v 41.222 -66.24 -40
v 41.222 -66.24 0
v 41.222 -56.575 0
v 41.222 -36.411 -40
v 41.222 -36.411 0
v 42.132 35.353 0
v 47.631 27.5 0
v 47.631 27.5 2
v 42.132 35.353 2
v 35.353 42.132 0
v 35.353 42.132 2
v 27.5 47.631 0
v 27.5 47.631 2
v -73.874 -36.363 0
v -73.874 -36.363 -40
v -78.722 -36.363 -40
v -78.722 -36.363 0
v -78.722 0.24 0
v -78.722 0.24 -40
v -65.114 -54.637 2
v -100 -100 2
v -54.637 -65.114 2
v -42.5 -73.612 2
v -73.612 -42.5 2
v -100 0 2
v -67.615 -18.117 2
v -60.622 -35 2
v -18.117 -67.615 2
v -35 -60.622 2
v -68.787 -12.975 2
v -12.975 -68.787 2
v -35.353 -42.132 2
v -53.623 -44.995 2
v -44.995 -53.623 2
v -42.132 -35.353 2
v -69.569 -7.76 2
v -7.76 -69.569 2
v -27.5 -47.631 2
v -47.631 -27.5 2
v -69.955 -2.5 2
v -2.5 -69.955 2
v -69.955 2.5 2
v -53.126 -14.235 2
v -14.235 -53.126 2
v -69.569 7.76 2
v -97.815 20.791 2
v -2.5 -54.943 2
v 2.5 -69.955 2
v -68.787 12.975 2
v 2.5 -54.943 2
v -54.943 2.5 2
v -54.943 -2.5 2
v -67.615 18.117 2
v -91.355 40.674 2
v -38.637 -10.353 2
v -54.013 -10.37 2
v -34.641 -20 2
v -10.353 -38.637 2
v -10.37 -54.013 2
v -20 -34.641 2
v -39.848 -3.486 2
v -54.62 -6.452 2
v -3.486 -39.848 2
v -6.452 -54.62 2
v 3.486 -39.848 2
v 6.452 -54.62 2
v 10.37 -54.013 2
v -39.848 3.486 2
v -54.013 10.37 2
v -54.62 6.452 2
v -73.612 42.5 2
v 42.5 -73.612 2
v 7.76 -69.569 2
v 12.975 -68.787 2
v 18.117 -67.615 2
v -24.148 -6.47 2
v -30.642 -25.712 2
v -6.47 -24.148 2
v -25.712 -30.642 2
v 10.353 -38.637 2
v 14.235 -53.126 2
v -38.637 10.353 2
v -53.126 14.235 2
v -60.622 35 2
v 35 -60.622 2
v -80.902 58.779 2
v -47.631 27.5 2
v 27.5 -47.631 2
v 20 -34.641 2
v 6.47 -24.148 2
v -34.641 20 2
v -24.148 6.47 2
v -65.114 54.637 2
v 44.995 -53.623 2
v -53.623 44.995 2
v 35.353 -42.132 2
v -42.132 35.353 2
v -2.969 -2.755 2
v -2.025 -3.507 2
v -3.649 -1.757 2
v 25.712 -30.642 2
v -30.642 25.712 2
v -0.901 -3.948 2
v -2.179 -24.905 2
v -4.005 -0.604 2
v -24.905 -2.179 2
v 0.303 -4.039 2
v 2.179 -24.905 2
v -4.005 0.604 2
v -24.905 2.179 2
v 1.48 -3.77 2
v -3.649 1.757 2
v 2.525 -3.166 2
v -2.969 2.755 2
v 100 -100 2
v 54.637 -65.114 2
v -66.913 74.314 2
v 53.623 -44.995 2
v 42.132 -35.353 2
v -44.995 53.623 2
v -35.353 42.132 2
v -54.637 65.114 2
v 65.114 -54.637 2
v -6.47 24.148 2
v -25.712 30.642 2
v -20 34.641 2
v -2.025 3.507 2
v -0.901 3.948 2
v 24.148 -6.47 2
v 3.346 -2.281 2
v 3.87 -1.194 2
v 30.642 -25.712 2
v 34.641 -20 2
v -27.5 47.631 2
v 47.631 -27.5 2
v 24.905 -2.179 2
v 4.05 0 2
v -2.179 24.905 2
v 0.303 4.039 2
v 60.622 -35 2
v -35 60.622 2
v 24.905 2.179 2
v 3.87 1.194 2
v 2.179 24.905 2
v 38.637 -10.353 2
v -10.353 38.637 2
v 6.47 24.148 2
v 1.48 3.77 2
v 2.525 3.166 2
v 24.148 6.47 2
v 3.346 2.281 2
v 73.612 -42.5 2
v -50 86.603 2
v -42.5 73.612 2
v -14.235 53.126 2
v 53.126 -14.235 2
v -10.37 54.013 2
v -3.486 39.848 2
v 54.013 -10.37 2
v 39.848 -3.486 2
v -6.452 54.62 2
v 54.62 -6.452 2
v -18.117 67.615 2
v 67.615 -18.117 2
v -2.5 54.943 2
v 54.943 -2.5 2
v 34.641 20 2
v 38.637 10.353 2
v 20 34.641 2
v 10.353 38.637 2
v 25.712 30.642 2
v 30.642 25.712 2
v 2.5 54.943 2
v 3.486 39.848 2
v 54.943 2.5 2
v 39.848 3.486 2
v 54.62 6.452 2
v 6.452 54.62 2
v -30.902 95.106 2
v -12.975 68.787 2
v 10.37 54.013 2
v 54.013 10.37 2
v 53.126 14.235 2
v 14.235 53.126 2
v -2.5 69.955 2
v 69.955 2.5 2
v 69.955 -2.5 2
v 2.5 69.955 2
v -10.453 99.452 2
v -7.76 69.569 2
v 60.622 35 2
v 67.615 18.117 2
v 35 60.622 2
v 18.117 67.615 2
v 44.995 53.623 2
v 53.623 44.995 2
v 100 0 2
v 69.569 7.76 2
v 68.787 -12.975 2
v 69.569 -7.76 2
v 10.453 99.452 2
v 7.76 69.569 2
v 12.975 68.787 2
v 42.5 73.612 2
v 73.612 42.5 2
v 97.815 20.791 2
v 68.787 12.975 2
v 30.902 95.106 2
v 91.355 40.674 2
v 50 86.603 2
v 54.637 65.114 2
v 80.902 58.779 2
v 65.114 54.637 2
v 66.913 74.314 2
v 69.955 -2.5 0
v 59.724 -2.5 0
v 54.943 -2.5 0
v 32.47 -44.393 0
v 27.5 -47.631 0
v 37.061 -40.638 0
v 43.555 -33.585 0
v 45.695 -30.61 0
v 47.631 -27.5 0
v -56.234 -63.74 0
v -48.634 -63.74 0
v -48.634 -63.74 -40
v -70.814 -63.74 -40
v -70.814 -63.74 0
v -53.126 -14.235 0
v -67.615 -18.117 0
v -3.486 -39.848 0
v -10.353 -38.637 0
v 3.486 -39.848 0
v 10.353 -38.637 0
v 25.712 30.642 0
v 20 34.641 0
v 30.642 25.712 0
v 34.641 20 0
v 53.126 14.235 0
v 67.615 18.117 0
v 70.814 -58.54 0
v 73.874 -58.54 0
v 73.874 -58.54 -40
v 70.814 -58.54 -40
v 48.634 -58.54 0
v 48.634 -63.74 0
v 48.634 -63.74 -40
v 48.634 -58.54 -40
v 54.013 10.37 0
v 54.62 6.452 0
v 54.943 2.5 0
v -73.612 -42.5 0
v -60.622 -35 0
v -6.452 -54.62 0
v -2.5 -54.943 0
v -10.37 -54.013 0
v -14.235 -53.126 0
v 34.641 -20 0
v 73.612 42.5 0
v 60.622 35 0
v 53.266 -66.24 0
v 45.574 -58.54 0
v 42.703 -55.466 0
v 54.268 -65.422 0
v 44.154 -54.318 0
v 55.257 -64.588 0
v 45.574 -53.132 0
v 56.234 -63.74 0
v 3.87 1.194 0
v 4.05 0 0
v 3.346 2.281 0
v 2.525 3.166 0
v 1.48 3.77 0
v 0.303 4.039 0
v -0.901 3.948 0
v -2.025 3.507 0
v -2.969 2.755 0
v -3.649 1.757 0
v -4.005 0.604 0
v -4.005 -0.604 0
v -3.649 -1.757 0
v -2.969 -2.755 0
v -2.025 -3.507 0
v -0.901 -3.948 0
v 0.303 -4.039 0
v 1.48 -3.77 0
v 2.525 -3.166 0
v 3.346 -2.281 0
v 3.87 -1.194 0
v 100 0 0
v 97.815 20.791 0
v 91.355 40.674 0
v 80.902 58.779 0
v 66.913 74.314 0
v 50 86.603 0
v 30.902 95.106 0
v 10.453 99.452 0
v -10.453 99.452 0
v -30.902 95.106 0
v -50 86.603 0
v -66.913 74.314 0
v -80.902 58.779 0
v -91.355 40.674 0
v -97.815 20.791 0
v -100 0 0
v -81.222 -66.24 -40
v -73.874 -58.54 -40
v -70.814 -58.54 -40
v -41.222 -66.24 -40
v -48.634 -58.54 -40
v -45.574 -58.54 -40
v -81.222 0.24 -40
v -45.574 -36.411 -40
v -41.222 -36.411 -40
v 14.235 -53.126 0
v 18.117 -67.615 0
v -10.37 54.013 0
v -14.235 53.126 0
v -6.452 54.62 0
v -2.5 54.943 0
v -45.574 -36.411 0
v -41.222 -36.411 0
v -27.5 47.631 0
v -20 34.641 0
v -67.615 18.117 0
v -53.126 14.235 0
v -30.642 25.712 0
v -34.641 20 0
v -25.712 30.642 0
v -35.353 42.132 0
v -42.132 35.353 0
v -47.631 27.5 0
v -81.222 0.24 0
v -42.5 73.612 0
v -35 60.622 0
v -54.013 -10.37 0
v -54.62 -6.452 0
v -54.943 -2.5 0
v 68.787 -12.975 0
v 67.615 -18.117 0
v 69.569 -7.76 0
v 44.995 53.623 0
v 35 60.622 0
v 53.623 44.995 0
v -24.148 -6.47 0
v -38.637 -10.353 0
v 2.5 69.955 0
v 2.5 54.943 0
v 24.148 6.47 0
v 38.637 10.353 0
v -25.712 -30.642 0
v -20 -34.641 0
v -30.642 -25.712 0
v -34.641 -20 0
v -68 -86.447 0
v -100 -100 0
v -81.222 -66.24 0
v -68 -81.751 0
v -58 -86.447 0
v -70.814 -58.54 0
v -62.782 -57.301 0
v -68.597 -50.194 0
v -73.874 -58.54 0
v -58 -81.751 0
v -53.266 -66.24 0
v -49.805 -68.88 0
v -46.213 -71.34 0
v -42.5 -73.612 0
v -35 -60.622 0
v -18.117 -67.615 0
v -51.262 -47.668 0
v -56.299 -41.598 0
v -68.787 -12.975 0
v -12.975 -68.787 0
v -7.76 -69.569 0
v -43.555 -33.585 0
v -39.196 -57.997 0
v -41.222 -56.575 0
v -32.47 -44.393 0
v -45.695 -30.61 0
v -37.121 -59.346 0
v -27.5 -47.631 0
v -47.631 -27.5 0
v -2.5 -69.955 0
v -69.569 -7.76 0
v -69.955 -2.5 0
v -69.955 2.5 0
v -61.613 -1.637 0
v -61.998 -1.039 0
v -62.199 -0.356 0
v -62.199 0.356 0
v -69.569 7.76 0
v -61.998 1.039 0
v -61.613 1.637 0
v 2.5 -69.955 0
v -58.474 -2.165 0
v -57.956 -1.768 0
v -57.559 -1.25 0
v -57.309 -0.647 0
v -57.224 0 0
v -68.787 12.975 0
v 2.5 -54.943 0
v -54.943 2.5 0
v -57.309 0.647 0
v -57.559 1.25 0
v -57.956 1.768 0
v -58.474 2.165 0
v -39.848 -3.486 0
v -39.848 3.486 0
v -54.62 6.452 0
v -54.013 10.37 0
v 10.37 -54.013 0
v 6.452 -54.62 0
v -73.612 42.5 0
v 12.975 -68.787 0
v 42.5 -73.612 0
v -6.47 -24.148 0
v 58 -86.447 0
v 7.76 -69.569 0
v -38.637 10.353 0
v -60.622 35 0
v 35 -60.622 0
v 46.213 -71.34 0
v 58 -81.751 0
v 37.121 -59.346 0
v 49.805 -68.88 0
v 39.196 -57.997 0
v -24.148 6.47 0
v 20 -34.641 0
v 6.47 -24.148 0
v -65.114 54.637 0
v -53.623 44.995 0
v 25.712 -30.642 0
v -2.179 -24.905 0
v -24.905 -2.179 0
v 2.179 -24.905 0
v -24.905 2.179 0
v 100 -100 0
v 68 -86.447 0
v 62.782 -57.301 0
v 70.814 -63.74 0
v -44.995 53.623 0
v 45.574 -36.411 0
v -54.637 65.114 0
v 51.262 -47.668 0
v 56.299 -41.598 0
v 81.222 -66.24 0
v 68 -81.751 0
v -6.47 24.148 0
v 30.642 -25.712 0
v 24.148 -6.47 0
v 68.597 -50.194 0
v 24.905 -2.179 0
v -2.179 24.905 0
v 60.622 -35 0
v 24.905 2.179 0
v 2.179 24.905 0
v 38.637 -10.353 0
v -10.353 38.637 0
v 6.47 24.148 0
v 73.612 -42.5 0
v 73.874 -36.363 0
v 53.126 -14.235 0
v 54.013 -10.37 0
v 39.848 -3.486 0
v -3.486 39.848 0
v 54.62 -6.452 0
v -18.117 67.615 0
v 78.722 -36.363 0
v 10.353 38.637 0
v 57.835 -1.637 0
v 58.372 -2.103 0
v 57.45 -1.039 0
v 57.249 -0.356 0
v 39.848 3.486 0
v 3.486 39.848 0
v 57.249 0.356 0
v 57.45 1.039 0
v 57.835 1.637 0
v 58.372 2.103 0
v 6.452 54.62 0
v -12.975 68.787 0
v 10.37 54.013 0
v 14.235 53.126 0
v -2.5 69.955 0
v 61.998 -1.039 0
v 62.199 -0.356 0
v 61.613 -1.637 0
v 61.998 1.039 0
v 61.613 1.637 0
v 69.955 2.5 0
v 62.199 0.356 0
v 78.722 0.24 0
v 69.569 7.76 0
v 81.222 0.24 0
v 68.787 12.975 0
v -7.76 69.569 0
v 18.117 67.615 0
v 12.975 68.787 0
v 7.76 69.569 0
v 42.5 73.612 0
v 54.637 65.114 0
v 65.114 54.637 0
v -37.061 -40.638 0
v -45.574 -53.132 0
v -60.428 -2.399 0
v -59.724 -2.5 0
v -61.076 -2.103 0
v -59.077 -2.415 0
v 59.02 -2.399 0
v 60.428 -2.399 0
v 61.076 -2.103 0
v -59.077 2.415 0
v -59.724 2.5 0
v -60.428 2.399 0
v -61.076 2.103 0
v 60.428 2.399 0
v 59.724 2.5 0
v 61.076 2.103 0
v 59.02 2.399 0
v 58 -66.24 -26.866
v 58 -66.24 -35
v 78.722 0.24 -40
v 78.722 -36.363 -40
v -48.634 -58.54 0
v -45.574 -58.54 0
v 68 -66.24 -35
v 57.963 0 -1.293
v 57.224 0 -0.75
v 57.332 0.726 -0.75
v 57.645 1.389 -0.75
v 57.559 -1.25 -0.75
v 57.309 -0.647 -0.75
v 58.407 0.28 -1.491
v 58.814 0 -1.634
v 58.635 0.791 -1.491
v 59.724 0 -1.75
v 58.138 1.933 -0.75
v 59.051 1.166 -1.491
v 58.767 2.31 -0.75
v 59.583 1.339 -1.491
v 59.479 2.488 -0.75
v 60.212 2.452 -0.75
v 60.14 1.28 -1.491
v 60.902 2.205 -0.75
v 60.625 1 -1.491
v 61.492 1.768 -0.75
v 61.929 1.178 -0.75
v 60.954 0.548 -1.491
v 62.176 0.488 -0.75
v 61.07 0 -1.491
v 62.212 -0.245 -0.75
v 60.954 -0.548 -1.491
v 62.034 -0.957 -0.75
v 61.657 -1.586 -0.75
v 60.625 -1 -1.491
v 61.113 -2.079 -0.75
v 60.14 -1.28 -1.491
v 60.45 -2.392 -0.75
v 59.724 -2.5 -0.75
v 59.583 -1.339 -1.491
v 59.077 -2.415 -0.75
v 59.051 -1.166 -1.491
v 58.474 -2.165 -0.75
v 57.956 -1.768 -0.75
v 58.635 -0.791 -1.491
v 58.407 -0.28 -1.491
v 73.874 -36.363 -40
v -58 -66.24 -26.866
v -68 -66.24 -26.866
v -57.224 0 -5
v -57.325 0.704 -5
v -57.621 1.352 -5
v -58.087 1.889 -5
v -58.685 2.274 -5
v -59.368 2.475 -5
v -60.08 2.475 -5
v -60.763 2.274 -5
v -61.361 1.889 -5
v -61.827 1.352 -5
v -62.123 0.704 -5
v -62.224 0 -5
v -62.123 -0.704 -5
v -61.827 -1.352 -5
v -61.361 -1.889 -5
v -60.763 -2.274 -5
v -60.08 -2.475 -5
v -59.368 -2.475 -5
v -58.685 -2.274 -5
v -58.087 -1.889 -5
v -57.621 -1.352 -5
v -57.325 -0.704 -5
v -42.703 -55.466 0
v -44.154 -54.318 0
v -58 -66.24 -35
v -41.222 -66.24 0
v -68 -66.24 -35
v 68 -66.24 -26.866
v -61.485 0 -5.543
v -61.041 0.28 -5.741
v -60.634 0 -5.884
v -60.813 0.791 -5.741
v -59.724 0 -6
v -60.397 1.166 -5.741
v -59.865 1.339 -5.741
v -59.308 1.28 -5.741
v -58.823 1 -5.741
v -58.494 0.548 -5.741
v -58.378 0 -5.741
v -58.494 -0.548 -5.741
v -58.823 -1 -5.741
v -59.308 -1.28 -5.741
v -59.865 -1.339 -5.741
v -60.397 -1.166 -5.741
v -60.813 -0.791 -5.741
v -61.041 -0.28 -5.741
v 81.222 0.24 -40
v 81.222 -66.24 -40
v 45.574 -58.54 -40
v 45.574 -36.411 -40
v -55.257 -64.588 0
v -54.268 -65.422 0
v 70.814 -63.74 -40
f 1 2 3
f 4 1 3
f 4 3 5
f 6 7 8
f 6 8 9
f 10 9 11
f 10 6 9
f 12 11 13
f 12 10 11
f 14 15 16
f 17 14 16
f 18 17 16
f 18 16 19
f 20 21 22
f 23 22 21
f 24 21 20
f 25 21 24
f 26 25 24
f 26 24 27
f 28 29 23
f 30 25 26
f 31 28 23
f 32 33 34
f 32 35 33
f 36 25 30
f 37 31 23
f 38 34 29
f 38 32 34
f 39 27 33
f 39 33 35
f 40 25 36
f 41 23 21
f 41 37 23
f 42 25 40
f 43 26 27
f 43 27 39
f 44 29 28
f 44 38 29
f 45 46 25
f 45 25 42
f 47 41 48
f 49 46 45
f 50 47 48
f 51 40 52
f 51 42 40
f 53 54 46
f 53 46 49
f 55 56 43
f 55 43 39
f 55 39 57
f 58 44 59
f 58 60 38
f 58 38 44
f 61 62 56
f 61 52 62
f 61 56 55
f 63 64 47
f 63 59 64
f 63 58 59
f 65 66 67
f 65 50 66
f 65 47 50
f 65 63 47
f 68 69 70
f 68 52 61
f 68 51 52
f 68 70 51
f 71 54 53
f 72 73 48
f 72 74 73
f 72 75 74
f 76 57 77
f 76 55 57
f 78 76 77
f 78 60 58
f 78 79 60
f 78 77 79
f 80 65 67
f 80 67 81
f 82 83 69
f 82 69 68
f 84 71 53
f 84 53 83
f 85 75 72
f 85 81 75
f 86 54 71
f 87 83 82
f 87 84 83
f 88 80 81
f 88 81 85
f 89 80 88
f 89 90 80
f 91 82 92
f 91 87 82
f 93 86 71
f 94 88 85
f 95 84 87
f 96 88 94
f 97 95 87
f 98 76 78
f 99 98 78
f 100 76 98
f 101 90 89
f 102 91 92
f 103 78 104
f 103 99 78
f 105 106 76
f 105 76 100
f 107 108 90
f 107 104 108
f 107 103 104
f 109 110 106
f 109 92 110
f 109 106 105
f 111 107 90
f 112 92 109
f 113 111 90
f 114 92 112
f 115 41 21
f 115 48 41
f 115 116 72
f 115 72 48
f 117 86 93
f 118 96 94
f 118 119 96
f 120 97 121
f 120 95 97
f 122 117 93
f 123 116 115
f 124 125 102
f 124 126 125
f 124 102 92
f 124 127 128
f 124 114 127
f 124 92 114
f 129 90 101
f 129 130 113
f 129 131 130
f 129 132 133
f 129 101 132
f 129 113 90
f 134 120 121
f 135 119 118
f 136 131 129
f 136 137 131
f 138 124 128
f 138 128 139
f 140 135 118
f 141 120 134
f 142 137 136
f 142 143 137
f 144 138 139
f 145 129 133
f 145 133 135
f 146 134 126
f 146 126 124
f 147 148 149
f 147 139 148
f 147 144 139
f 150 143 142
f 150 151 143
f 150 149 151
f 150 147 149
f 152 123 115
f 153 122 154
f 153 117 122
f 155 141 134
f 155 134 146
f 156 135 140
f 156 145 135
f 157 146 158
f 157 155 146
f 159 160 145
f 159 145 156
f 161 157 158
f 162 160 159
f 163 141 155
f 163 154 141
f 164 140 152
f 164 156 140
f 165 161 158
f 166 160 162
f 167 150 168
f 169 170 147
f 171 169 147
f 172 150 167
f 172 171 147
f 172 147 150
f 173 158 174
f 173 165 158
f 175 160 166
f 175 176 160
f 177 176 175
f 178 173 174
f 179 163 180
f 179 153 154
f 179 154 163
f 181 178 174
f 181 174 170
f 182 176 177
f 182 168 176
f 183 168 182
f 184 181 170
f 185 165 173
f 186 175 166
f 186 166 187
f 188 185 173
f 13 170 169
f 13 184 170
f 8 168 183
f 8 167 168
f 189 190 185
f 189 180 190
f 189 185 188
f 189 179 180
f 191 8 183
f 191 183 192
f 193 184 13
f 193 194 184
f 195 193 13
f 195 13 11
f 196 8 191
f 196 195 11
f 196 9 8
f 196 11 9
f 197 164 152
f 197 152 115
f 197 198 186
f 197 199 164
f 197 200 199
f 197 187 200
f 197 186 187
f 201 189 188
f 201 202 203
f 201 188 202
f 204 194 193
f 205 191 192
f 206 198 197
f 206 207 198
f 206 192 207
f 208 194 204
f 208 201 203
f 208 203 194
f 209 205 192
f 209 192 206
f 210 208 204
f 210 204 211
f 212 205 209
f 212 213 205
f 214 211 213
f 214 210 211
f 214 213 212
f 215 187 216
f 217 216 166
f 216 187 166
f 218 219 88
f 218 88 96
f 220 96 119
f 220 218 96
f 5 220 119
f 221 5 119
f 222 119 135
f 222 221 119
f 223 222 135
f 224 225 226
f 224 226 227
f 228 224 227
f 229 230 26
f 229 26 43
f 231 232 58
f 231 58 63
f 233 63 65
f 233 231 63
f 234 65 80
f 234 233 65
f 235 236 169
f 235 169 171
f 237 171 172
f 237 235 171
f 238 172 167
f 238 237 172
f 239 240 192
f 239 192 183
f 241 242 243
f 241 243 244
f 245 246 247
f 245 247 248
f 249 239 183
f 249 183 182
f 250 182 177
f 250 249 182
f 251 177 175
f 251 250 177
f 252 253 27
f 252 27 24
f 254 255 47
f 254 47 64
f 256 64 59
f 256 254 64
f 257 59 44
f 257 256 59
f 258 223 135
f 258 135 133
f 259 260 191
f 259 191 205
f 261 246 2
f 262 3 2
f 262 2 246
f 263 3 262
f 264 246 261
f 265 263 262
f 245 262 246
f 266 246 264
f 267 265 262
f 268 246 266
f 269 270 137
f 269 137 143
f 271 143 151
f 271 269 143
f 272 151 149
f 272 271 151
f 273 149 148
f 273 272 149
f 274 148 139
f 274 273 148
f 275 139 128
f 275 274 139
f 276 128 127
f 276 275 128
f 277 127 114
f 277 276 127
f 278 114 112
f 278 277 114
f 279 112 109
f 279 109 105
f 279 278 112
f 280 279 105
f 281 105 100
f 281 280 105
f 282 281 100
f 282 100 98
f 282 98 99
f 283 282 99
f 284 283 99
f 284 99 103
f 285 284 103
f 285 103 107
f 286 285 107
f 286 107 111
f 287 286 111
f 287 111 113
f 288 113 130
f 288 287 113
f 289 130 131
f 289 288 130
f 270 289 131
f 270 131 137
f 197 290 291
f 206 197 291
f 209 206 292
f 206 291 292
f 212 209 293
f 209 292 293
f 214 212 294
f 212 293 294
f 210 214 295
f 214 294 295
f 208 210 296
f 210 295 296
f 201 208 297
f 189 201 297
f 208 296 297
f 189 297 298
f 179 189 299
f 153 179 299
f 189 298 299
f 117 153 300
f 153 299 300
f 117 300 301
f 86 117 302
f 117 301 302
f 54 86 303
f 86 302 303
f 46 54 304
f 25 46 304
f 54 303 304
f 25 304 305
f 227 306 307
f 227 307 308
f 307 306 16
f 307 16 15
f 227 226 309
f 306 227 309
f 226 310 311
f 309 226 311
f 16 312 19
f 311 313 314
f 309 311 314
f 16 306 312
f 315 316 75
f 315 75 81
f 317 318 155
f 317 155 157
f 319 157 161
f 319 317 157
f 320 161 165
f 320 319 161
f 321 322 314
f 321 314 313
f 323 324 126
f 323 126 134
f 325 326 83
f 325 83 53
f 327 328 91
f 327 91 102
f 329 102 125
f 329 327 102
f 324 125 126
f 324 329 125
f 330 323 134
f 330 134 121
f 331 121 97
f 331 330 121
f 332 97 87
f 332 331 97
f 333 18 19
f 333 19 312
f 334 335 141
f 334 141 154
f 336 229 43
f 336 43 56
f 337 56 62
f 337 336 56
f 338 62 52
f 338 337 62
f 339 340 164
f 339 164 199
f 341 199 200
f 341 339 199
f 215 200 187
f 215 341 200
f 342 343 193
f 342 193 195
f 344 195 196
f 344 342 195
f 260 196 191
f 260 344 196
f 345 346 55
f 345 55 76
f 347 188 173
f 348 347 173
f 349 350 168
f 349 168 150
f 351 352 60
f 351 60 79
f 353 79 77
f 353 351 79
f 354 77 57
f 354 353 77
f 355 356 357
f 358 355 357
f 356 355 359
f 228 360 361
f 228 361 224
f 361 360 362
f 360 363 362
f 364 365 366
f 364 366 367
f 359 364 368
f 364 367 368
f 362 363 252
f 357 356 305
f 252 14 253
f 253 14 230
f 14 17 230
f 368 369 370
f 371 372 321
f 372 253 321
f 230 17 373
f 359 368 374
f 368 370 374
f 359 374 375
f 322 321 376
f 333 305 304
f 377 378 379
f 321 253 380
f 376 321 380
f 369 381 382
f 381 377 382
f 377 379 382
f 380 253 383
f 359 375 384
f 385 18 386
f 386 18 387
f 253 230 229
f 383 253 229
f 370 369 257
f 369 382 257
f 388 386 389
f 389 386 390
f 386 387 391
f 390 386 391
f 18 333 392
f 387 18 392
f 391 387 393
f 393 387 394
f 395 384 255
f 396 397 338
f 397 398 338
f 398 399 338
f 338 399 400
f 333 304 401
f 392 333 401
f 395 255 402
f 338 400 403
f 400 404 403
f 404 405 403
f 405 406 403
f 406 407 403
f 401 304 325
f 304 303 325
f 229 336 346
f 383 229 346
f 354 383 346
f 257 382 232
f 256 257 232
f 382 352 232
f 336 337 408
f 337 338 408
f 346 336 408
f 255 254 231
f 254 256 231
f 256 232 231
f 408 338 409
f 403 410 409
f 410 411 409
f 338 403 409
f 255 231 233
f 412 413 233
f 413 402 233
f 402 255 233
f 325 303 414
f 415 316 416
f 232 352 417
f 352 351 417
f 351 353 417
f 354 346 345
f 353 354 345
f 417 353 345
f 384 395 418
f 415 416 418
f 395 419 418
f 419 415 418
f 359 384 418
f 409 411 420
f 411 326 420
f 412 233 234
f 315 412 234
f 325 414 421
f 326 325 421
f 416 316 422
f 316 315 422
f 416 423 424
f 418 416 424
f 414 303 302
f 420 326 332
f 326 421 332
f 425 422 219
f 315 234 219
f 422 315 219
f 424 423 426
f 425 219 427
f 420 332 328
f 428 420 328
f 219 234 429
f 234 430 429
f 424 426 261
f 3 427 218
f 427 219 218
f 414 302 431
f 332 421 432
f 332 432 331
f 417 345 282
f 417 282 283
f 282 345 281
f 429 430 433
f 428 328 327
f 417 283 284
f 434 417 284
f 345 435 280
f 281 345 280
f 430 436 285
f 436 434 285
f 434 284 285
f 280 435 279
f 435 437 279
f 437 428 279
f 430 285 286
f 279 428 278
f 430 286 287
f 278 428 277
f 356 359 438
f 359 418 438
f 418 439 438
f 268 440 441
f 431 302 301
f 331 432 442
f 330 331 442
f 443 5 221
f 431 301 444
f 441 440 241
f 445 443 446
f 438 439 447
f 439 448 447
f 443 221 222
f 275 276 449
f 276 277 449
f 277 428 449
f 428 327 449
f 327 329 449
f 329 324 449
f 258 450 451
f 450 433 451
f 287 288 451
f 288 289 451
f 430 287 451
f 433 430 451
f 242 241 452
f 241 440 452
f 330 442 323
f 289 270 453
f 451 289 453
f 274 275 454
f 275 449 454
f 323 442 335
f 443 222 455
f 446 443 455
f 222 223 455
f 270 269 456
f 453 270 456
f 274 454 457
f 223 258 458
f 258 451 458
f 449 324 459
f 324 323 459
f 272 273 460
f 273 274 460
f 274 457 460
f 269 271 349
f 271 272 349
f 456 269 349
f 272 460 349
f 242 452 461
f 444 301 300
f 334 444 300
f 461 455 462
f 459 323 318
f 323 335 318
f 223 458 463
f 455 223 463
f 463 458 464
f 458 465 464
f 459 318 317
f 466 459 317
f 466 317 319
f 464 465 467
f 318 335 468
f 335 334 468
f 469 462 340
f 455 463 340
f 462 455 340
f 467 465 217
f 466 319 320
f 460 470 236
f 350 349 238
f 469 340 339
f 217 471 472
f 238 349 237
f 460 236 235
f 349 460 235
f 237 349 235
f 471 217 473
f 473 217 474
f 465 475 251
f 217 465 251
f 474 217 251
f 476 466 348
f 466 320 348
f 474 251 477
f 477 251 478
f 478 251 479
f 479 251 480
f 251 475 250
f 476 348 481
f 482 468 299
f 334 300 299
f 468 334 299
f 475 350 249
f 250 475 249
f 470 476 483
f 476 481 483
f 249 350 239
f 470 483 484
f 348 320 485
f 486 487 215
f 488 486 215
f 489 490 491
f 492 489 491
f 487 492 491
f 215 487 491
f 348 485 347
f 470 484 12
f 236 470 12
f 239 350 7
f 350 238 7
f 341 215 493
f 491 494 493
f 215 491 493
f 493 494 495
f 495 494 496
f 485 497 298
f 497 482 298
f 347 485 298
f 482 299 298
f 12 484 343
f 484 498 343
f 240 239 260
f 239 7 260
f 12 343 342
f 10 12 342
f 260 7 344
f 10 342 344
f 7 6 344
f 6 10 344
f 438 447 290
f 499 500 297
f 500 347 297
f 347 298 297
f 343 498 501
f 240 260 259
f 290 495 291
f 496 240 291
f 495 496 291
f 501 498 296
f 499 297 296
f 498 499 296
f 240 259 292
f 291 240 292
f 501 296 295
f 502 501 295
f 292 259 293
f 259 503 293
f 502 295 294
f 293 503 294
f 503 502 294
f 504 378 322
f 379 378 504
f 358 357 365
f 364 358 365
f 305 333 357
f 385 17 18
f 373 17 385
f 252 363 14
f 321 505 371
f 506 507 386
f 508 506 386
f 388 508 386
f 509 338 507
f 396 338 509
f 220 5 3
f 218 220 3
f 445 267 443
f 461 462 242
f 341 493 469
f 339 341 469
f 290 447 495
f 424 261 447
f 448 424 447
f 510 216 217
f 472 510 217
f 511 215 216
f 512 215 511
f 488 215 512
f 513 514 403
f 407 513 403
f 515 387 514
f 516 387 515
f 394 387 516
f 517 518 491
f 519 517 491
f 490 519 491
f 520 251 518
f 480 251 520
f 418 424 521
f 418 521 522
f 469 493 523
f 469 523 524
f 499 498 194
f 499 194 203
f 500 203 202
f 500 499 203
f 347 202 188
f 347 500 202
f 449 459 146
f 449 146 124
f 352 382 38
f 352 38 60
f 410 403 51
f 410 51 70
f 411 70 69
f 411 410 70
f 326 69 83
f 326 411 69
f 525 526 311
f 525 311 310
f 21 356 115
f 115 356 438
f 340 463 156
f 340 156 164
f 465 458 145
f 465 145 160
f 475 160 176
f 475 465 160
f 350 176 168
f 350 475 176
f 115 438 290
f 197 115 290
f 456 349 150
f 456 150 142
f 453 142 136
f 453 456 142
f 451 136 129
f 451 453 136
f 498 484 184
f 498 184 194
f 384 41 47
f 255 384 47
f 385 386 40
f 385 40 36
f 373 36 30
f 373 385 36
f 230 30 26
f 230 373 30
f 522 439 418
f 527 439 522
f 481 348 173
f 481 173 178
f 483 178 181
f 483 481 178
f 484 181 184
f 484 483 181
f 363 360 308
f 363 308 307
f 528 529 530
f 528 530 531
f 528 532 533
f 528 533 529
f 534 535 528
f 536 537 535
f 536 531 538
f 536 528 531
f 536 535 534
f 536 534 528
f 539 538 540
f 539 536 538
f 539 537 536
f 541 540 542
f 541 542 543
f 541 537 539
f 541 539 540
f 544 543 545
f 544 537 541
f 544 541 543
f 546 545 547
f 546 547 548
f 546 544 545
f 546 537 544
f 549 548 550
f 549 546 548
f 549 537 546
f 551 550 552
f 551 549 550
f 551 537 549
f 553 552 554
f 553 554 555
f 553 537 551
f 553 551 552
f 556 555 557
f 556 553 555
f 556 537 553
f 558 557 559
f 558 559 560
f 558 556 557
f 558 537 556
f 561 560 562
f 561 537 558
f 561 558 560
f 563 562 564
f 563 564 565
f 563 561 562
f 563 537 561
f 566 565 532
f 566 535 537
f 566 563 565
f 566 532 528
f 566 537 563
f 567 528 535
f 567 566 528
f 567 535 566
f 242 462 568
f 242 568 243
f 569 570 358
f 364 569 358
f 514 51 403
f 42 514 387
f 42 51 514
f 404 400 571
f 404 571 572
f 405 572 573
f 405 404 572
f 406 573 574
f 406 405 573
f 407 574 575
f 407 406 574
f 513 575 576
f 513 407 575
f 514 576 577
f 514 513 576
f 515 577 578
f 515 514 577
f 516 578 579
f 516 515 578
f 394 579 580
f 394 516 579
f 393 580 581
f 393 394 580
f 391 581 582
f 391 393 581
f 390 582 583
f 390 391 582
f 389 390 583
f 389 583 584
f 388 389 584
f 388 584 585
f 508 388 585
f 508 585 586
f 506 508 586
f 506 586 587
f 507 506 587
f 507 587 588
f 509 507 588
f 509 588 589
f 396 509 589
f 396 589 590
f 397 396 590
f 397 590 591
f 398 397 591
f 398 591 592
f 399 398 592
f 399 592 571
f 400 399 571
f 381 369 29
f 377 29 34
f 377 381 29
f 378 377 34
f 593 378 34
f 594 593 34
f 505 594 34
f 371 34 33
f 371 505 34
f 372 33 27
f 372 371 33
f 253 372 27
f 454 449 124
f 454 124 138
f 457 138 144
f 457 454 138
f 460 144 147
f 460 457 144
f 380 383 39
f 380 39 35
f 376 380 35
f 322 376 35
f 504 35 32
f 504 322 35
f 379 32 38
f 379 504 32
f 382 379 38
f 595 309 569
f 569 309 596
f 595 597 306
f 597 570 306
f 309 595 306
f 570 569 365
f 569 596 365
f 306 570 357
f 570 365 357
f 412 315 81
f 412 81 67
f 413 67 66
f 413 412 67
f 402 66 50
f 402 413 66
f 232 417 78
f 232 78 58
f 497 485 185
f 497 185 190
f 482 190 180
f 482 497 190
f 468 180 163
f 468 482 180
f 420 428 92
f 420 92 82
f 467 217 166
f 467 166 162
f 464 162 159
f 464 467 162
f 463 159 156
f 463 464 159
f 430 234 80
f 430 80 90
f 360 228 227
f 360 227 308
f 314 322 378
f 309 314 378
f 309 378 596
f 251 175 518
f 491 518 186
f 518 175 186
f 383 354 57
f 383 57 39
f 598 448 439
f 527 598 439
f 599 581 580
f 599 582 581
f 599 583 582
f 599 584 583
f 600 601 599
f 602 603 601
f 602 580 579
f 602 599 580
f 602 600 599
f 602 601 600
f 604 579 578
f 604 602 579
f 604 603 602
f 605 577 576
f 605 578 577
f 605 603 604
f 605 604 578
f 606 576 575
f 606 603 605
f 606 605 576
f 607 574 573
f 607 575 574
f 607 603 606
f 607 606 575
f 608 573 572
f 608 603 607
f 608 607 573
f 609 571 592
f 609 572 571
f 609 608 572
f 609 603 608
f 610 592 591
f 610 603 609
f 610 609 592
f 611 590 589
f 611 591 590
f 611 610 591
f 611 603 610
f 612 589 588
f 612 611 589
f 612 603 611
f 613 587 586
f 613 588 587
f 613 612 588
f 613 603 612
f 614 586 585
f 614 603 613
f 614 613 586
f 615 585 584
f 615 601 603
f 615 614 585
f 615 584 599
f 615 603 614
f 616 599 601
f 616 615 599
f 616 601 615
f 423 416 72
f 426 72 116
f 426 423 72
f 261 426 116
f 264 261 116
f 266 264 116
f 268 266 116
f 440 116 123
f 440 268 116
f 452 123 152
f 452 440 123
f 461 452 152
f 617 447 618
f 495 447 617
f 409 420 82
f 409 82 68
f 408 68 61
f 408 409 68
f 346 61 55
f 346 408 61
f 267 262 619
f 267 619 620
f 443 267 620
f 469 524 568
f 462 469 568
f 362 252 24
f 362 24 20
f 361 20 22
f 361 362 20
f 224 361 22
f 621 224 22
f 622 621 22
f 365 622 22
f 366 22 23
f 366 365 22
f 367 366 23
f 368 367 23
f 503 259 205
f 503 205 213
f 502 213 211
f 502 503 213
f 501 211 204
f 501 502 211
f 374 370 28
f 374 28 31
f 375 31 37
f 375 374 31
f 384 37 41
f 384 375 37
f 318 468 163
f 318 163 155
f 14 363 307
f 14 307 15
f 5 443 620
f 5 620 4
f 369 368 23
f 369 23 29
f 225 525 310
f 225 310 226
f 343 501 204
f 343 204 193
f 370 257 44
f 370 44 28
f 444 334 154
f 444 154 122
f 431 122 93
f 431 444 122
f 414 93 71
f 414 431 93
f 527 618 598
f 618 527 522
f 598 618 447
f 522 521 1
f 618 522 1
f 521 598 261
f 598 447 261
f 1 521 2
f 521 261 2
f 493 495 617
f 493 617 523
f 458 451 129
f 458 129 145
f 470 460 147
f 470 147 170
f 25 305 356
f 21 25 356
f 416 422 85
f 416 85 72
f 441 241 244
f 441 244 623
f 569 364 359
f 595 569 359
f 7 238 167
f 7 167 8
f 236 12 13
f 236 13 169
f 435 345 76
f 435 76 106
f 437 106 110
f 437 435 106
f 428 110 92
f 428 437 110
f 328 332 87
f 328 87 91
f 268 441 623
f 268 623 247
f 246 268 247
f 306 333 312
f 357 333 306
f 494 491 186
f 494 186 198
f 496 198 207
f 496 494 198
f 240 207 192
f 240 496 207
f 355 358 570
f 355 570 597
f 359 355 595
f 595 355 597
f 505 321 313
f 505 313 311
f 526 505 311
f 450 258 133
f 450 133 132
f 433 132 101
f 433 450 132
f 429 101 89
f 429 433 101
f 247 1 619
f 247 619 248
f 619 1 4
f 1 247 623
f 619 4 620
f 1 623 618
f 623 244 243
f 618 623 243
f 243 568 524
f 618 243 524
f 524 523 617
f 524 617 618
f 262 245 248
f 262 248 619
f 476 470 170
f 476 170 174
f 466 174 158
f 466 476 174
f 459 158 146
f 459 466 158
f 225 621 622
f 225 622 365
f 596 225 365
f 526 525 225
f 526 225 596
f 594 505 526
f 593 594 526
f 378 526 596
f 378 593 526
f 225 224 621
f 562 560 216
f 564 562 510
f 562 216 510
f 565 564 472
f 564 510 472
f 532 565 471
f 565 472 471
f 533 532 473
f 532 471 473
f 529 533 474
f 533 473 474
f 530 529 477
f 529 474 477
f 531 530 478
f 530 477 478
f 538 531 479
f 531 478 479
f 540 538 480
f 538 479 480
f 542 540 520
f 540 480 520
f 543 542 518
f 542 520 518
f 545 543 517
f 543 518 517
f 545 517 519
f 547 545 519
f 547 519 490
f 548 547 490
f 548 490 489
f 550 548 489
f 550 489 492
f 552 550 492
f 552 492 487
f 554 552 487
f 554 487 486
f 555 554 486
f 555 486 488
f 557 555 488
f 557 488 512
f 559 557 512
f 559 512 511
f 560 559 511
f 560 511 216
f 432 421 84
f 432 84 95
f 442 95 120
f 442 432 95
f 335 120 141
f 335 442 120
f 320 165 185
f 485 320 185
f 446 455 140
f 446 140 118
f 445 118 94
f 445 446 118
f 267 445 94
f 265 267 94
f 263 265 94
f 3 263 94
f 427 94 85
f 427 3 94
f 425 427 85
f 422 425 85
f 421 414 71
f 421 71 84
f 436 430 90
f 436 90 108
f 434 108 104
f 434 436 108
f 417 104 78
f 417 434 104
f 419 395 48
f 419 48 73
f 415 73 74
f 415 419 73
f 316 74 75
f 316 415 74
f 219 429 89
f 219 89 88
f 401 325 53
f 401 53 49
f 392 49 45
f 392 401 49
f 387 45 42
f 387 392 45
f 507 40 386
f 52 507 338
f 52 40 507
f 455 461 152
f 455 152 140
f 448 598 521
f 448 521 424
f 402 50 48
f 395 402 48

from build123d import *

# Parameters (mm, degrees)
SKETCH2_R           = 4.05
BOSS_EXTRUDE1_DEPTH = 2
BOSS_EXTRUDE2_DEPTH = 40
BOSS_EXTRUDE3_DEPTH = 5
BOSS_EXTRUDE4_DEPTH = 2
SKETCH10_R          = 2.5
BOSS_EXTRUDE5_DEPTH = 7
DOME1_FACE_RADIUS   = 2.5
DOME1_HEIGHT        = 1
SKETCH12_R          = 2.5
BOSS_EXTRUDE6_DEPTH = 0.75
DOME2_FACE_RADIUS   = 2.5
DOME2_HEIGHT        = 1


with BuildPart() as part:
    # Sketch2 → Boss-Extrude1 (new body)
    with BuildSketch(Plane.XY):
        with BuildLine():
            Line((-100, 0), (-100, -100))
            Line((-100, -100), (100, -100))
            Line((100, -100), (100, 0))
            ThreePointArc((100, 0), (0, 100), (-100, 0))
        make_face()
        Circle(SKETCH2_R, mode=Mode.SUBTRACT)
        with BuildLine():
            Line((6.470476128, 24.148145657), (10.352761804, 38.637033052))
            ThreePointArc((10.352761804, 38.637033052), (0, 40), (-10.352761804, 38.637033052))
            Line((-10.352761804, 38.637033052), (-6.470476128, 24.148145657))
            ThreePointArc((-6.470476128, 24.148145657), (0, 25), (6.470476128, 24.148145657))
        make_face(mode=Mode.SUBTRACT)
        with BuildLine():
            Line((14.235047481, 53.125920446), (18.117333157, 67.61480784))
            ThreePointArc((18.117333157, 67.61480784), (0, 70), (-18.117333157, 67.61480784))
            Line((-18.117333157, 67.61480784), (-14.235047481, 53.125920446))
            ThreePointArc((-14.235047481, 53.125920446), (0, 55), (14.235047481, 53.125920446))
        make_face(mode=Mode.SUBTRACT)
        with BuildLine():
            Line((-20, 34.641016151), (-27.5, 47.631397208))
            ThreePointArc((-27.5, 47.631397208), (-38.890872965, 38.890872965), (-47.631397208, 27.5))
            Line((-47.631397208, 27.5), (-34.641016151, 20))
            ThreePointArc((-34.641016151, 20), (-28.284271247, 28.284271247), (-20, 34.641016151))
        make_face(mode=Mode.SUBTRACT)
        with BuildLine():
            Line((-35, 60.621778265), (-42.5, 73.612159322))
            ThreePointArc((-42.5, 73.612159322), (-60.104076401, 60.104076401), (-73.612159322, 42.5))
            Line((-73.612159322, 42.5), (-60.621778265, 35))
            ThreePointArc((-60.621778265, 35), (-49.497474683, 49.497474683), (-35, 60.621778265))
        make_face(mode=Mode.SUBTRACT)
        with BuildLine():
            Line((42.5, 73.612159322), (35, 60.621778265))
            ThreePointArc((35, 60.621778265), (49.497474683, 49.497474683), (60.621778265, 35))
            Line((60.621778265, 35), (73.612159322, 42.5))
            ThreePointArc((73.612159322, 42.5), (60.104076401, 60.104076401), (42.5, 73.612159322))
        make_face(mode=Mode.SUBTRACT)
        with BuildLine():
            Line((27.5, 47.631397208), (20, 34.641016151))
            ThreePointArc((20, 34.641016151), (28.284271247, 28.284271247), (34.641016151, 20))
            Line((34.641016151, 20), (47.631397208, 27.5))
            ThreePointArc((47.631397208, 27.5), (38.890872965, 38.890872965), (27.5, 47.631397208))
        make_face(mode=Mode.SUBTRACT)
        with BuildLine():
            Line((24.148145657, -6.470476128), (38.637033052, -10.352761804))
            ThreePointArc((38.637033052, -10.352761804), (40, 0), (38.637033052, 10.352761804))
            Line((38.637033052, 10.352761804), (24.148145657, 6.470476128))
            ThreePointArc((24.148145657, 6.470476128), (25, 0), (24.148145657, -6.470476128))
        make_face(mode=Mode.SUBTRACT)
        with BuildLine():
            Line((53.125920446, -14.235047481), (67.61480784, -18.117333157))
            ThreePointArc((67.61480784, -18.117333157), (70, 0), (67.61480784, 18.117333157))
            Line((67.61480784, 18.117333157), (53.125920446, 14.235047481))
            ThreePointArc((53.125920446, 14.235047481), (55, 0), (53.125920446, -14.235047481))
        make_face(mode=Mode.SUBTRACT)
        with BuildLine():
            Line((73.612159322, -42.5), (60.621778265, -35))
            ThreePointArc((60.621778265, -35), (49.497474683, -49.497474683), (35, -60.621778265))
            Line((35, -60.621778265), (42.5, -73.612159322))
            ThreePointArc((42.5, -73.612159322), (60.104076401, -60.104076401), (73.612159322, -42.5))
        make_face(mode=Mode.SUBTRACT)
        with BuildLine():
            Line((47.631397208, -27.5), (34.641016151, -20))
            ThreePointArc((34.641016151, -20), (28.284271247, -28.284271247), (20, -34.641016151))
            Line((20, -34.641016151), (27.5, -47.631397208))
            ThreePointArc((27.5, -47.631397208), (38.890872965, -38.890872965), (47.631397208, -27.5))
        make_face(mode=Mode.SUBTRACT)
        with BuildLine():
            Line((-6.470476128, -24.148145657), (-10.352761804, -38.637033052))
            ThreePointArc((-10.352761804, -38.637033052), (0, -40), (10.352761804, -38.637033052))
            Line((10.352761804, -38.637033052), (6.470476128, -24.148145657))
            ThreePointArc((6.470476128, -24.148145657), (0, -25), (-6.470476128, -24.148145657))
        make_face(mode=Mode.SUBTRACT)
        with BuildLine():
            Line((-14.235047481, -53.125920446), (-18.117333157, -67.61480784))
            ThreePointArc((-18.117333157, -67.61480784), (0, -70), (18.117333157, -67.61480784))
            Line((18.117333157, -67.61480784), (14.235047481, -53.125920446))
            ThreePointArc((14.235047481, -53.125920446), (0, -55), (-14.235047481, -53.125920446))
        make_face(mode=Mode.SUBTRACT)
        with BuildLine():
            Line((-42.5, -73.612159322), (-35, -60.621778265))
            ThreePointArc((-35, -60.621778265), (-49.497474683, -49.497474683), (-60.621778265, -35))
            Line((-60.621778265, -35), (-73.612159322, -42.5))
            ThreePointArc((-73.612159322, -42.5), (-60.104076401, -60.104076401), (-42.5, -73.612159322))
        make_face(mode=Mode.SUBTRACT)
        with BuildLine():
            Line((-27.5, -47.631397208), (-20, -34.641016151))
            ThreePointArc((-20, -34.641016151), (-28.284271247, -28.284271247), (-34.641016151, -20))
            Line((-34.641016151, -20), (-47.631397208, -27.5))
            ThreePointArc((-47.631397208, -27.5), (-38.890872965, -38.890872965), (-27.5, -47.631397208))
        make_face(mode=Mode.SUBTRACT)
        with BuildLine():
            Line((-24.148145657, 6.470476128), (-38.637033052, 10.352761804))
            ThreePointArc((-38.637033052, 10.352761804), (-40, 0), (-38.637033052, -10.352761804))
            Line((-38.637033052, -10.352761804), (-24.148145657, -6.470476128))
            ThreePointArc((-24.148145657, -6.470476128), (-25, 0), (-24.148145657, 6.470476128))
        make_face(mode=Mode.SUBTRACT)
        with BuildLine():
            Line((-53.125920446, 14.235047481), (-67.61480784, 18.117333157))
            ThreePointArc((-67.61480784, 18.117333157), (-70, 0), (-67.61480784, -18.117333157))
            Line((-67.61480784, -18.117333157), (-53.125920446, -14.235047481))
            ThreePointArc((-53.125920446, -14.235047481), (-55, 0), (-53.125920446, 14.235047481))
        make_face(mode=Mode.SUBTRACT)
    extrude(amount=BOSS_EXTRUDE1_DEPTH)

    # Sketch4 → Boss-Extrude2 (add)
    with BuildSketch(Plane(origin=(0, 0, 0), x_dir=(-1, 0, 0), z_dir=(0, 0, -1))):
        Polygon((-70.814, -63.74), (-48.634, -63.74), (-48.634, -58.54), (-45.574, -58.54), (-45.574, -36.410509339), (-41.222261094, -36.410509339), (-41.222261094, -63.74), (-41.222261094, -66.24), (-76.222261094, -66.24), (-81.222261094, -66.24), (-81.222261094, 0.239543082), (-78.722261094, 0.239543082), (-78.722261094, -36.363042073), (-73.874, -36.363042073), (-73.874, -58.54), (-70.814, -58.54), align=None)
        Polygon((81.222261094, -66.24), (76.222261094, -66.24), (41.222261094, -66.24), (41.222261094, -63.74), (41.222261094, -36.410509339), (45.574, -36.410509339), (45.574, -58.54), (48.634, -58.54), (48.634, -63.74), (70.814, -63.74), (70.814, -58.54), (73.874, -58.54), (73.874, -36.363042073), (78.722261094, -36.363042073), (78.722261094, 0.239543082), (81.222261094, 0.239543082), align=None)
    extrude(amount=BOSS_EXTRUDE2_DEPTH)

    # Sketch7 → Boss-Extrude3 (add, symmetric)
    with BuildSketch(Plane(origin=(63, 0, 0), x_dir=(0, 0, -1), z_dir=(1, 0, 0))):
        Polygon((0, -86.447259422), (35, -66.24), (26.86565258, -66.24), (0, -81.750891749), align=None)
    boss_extrude3 = extrude(amount=BOSS_EXTRUDE3_DEPTH, both=True)

    # Mirror1: Boss-Extrude3 across plane
    add(boss_extrude3.mirror(Plane(origin=(0, 0, 0), x_dir=(0, 0, 1), z_dir=(1, 0, 0))))


with BuildPart() as boss_extrude4_tool:
    # Sketch8 → Boss-Extrude4 (new body)
    with BuildSketch(Plane.XY.offset(2)):
        with BuildLine():
            Line((-54.94315244, 2.5), (-69.955342898, 2.5))
            add(Edge.make_bspline(
                [(-69.955342898, 2.5), (-70.044657102, 0), (-69.955342898, -2.5)],
                knots=[0, 0, 0, 1, 1, 1], degree=2))
            Line((-69.955342898, -2.5), (-54.94315244, -2.5))
            add(Edge.make_bspline(
                [(-54.94315244, 2.5), (-55.05684756, 0), (-54.94315244, -2.5)],
                knots=[0, 0, 0, 1, 1, 1], degree=2))
        make_face()
        with BuildLine():
            Line((-2.5, 54.94315244), (-2.5, 69.955342898))
            add(Edge.make_bspline(
                [(2.5, 69.955342898), (0, 70.044657102), (-2.5, 69.955342898)],
                knots=[0, 0, 0, 1, 1, 1], degree=2))
            Line((2.5, 69.955342898), (2.5, 54.94315244))
            add(Edge.make_bspline(
                [(2.5, 54.94315244), (0, 55.05684756), (-2.5, 54.94315244)],
                knots=[0, 0, 0, 1, 1, 1], degree=2))
        make_face()
        with BuildLine():
            Line((54.94315244, 2.5), (69.955342898, 2.5))
            add(Edge.make_bspline(
                [(69.955342898, -2.5), (70.044657102, 0), (69.955342898, 2.5)],
                knots=[0, 0, 0, 1, 1, 1], degree=2))
            Line((69.955342898, -2.5), (54.94315244, -2.5))
            add(Edge.make_bspline(
                [(54.94315244, -2.5), (55.05684756, 0), (54.94315244, 2.5)],
                knots=[0, 0, 0, 1, 1, 1], degree=2))
        make_face()
        with BuildLine():
            Line((2.5, -54.94315244), (2.5, -69.955342898))
            add(Edge.make_bspline(
                [(-2.5, -69.955342898), (0, -70.044657102), (2.5, -69.955342898)],
                knots=[0, 0, 0, 1, 1, 1], degree=2))
            Line((-2.5, -69.955342898), (-2.5, -54.94315244))
            add(Edge.make_bspline(
                [(-2.5, -54.94315244), (0, -55.05684756), (2.5, -54.94315244)],
                knots=[0, 0, 0, 1, 1, 1], degree=2))
        make_face()
    extrude(amount=-BOSS_EXTRUDE4_DEPTH)


with BuildPart() as part_1:
    add(part.part)


with BuildPart() as part_2:
    # Boss-Extrude4: joined with boss_extrude4_tool
    add(part_1.part.fuse(boss_extrude4_tool.part, tol=0.00001))

    # Sketch10 → Boss-Extrude5 (add)
    with BuildSketch(Plane.XY.offset(2)):
        with Locations((-59.724, 0)):
            Circle(SKETCH10_R)
    extrude(amount=-BOSS_EXTRUDE5_DEPTH)

    # Dome1: a dome of height H over a round flat face of radius A is a cap of a sphere of radius (A * A + H * H) / (2 * H)
    dome1_r = (DOME1_FACE_RADIUS * DOME1_FACE_RADIUS + DOME1_HEIGHT * DOME1_HEIGHT) / (2 * DOME1_HEIGHT)
    dome1_base = Plane((-59.724, 0, -5), z_dir=(0, 0, -1))
    with Locations(dome1_base.offset(DOME1_HEIGHT - dome1_r)):
        dome1_ball = Sphere(dome1_r, mode=Mode.PRIVATE)
    add(split(dome1_ball, bisect_by=dome1_base, keep=Keep.TOP, mode=Mode.PRIVATE))

    # Sketch12 → Boss-Extrude6 (add)
    with BuildSketch(Plane(origin=(0, 0, 0), x_dir=(-1, 0, 0), z_dir=(0, 0, -1))):
        with Locations(Location((-59.724, 0, 0), (0, 0, 270))):
            Circle(SKETCH12_R)
    extrude(amount=BOSS_EXTRUDE6_DEPTH)

    # Dome2: a dome of height H over a round flat face of radius A is a cap of a sphere of radius (A * A + H * H) / (2 * H)
    dome2_r = (DOME2_FACE_RADIUS * DOME2_FACE_RADIUS + DOME2_HEIGHT * DOME2_HEIGHT) / (2 * DOME2_HEIGHT)
    dome2_base = Plane((59.724, 0, -0.75), z_dir=(0, 0, -1))
    with Locations(dome2_base.offset(DOME2_HEIGHT - dome2_r)):
        dome2_ball = Sphere(dome2_r, mode=Mode.PRIVATE)
    add(split(dome2_ball, bisect_by=dome2_base, keep=Keep.TOP, mode=Mode.PRIVATE))


solid = part_2.part
